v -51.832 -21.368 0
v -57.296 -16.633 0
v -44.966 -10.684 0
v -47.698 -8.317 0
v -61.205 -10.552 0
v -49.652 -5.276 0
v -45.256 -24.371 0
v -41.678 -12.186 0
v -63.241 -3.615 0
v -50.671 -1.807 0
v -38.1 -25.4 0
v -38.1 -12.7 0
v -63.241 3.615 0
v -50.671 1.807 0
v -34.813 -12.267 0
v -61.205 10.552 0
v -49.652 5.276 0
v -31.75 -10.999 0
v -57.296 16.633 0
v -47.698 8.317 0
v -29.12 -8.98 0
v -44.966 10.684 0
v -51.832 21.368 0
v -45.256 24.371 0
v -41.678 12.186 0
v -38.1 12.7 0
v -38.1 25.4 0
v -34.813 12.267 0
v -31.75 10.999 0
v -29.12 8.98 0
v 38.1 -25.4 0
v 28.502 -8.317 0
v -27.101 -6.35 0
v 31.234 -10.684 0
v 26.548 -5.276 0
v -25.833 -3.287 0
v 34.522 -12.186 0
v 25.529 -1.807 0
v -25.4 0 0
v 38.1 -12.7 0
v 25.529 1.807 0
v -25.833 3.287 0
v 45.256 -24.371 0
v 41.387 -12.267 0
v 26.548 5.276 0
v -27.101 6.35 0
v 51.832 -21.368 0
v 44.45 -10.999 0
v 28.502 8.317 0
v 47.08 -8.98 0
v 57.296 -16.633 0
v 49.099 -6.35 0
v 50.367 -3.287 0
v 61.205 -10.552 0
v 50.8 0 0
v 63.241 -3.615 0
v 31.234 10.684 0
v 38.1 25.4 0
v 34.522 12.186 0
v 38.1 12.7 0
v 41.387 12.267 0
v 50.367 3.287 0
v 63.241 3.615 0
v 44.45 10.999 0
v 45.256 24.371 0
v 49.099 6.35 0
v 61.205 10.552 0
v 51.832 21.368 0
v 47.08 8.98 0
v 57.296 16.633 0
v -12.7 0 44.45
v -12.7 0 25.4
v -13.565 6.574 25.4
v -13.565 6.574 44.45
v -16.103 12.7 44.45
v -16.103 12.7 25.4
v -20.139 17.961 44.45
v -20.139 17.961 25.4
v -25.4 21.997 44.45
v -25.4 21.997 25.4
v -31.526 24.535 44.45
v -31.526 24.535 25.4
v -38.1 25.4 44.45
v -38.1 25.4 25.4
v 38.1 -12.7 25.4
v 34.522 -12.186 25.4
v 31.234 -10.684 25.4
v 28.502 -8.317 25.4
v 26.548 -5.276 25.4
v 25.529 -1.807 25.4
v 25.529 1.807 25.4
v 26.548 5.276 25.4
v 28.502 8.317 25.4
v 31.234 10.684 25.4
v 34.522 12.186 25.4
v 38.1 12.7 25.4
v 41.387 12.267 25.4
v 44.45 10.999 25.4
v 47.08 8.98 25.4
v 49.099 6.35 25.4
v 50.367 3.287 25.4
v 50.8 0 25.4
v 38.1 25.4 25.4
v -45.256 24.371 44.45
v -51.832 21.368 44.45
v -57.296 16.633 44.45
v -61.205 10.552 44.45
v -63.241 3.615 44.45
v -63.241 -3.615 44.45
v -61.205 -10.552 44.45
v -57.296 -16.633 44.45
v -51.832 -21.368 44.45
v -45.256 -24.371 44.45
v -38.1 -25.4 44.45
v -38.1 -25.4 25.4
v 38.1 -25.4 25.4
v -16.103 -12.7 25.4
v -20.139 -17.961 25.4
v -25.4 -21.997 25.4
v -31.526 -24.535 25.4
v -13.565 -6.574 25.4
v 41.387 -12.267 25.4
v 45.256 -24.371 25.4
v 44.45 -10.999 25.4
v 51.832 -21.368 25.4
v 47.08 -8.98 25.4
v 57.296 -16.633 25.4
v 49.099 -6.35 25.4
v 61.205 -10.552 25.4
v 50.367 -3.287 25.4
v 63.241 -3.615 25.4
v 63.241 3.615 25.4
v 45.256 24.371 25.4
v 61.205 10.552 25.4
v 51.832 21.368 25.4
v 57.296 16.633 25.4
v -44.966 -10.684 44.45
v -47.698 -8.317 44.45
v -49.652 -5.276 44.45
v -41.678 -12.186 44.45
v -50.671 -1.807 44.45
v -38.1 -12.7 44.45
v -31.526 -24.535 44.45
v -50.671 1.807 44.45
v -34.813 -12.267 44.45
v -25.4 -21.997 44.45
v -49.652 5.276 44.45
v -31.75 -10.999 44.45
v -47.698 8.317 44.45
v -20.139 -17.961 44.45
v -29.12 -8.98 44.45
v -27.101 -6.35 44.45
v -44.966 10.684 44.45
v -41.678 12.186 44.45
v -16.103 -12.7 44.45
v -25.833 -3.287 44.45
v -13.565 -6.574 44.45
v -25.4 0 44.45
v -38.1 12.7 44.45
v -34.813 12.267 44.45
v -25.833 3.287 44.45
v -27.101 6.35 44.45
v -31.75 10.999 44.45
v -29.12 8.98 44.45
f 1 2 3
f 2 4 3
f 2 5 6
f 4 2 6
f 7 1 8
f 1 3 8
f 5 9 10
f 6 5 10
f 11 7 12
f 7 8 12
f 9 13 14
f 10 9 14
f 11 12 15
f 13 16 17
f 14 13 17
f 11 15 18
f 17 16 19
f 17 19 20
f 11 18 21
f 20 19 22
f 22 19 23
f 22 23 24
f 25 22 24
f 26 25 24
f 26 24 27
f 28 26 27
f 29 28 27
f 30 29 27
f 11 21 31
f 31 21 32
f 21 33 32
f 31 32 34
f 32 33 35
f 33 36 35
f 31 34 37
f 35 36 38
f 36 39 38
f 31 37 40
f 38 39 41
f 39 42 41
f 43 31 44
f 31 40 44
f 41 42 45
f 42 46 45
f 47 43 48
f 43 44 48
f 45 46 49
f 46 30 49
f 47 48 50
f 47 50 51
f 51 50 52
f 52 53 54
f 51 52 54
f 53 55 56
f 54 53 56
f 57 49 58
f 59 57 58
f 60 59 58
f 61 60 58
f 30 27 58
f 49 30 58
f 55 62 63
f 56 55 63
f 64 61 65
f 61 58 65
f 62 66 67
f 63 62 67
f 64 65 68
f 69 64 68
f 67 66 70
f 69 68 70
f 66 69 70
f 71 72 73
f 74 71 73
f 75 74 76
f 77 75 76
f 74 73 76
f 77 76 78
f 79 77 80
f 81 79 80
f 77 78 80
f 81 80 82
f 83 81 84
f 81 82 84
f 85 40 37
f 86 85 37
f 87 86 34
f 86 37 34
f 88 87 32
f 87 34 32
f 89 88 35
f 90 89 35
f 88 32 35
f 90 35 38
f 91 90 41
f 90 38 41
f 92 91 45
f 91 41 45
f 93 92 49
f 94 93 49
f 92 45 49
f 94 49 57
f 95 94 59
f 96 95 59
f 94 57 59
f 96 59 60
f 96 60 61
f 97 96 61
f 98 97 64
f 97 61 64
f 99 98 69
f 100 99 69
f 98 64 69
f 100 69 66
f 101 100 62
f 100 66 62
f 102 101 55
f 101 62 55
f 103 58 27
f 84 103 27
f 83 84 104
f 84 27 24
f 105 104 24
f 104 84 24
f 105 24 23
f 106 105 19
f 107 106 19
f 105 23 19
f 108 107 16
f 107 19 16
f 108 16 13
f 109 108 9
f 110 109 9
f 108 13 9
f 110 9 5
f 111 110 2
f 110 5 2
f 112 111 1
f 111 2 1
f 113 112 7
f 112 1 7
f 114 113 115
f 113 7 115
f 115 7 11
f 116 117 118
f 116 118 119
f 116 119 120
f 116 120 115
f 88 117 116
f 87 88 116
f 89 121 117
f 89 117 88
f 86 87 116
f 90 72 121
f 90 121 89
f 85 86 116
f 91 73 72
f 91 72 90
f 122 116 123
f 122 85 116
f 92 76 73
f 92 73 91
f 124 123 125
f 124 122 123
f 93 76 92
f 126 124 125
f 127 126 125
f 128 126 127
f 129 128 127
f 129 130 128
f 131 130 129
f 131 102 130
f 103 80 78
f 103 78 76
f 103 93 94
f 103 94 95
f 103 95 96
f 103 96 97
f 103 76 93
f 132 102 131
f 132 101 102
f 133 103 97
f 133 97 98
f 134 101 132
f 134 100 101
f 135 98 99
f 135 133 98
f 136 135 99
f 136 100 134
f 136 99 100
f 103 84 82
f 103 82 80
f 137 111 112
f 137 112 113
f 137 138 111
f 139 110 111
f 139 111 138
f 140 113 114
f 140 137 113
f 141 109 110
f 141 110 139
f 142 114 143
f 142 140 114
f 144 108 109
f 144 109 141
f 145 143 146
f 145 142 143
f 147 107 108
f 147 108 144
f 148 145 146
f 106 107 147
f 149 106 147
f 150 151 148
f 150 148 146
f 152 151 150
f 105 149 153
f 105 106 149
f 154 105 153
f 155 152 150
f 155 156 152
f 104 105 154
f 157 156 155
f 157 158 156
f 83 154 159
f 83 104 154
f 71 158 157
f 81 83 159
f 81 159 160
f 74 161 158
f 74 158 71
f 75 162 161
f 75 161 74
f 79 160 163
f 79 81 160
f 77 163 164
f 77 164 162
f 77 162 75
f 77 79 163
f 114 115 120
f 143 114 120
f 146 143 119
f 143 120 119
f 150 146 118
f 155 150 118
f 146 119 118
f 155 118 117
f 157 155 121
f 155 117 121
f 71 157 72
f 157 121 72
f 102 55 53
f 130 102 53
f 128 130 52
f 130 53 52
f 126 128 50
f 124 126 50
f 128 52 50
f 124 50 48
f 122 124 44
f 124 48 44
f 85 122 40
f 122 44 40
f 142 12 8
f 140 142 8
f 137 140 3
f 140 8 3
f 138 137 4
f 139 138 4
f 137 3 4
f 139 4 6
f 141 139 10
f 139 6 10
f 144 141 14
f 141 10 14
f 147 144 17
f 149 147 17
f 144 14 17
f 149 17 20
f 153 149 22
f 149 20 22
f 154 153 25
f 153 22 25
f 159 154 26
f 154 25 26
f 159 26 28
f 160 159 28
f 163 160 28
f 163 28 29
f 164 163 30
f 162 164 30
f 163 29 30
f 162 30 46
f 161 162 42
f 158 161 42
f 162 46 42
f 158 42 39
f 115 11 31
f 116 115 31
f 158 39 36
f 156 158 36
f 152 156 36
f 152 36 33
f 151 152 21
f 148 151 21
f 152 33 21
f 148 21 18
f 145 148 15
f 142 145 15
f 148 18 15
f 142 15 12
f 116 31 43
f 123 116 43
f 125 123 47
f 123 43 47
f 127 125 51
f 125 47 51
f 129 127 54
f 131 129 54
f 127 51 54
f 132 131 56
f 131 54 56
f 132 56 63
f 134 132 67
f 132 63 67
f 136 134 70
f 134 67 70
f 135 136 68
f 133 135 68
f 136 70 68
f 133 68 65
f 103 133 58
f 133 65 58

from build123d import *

# Parameters (mm, degrees)
F1_DEPTH = 44.45
F2_DEPTH = 25.4


with BuildPart() as f1:
    # F0 (on Top) → F1 (new body)
    with BuildSketch(Plane.XY):
        with BuildLine():
            Line((-38.1, -12.7), (-38.1, -25.4))
            ThreePointArc((-38.1, -25.4), (-20.139488, -17.960512), (-12.7, 0))
            ThreePointArc((-12.7, 0), (-20.139488, 17.960512), (-38.1, 25.4))
            Line((-38.1, 25.4), (-38.1, 12.7))
            ThreePointArc((-38.1, 12.7), (-29.119744, 8.980256), (-25.4, 0))
            ThreePointArc((-25.4, 0), (-29.119744, -8.980256), (-38.1, -12.7))
        make_face()
        with BuildLine():
            ThreePointArc((-38.1, 25.4), (-63.5, 0), (-38.1, -25.4))
            Line((-38.1, -25.4), (-38.1, -12.7))
            ThreePointArc((-38.1, -12.7), (-50.8, 0), (-38.1, 12.7))
            Line((-38.1, 12.7), (-38.1, 25.4))
        make_face()
    extrude(amount=F1_DEPTH)

    # F0 (on Top) → F2 (join)
    with BuildSketch(Plane.XY):
        with BuildLine():
            ThreePointArc((-12.7, 0), (-20.139488, -17.960512), (-38.1, -25.4))
            Line((-38.1, -25.4), (38.1, -25.4))
            Line((38.1, -25.4), (38.1, -12.7))
            ThreePointArc((38.1, -12.7), (25.4, 0), (38.1, 12.7))
            Line((38.1, 12.7), (38.1, 25.4))
            Line((38.1, 25.4), (-38.1, 25.4))
            ThreePointArc((-38.1, 25.4), (-20.139488, 17.960512), (-12.7, 0))
        make_face()
        with BuildLine():
            ThreePointArc((-38.1, 25.4), (-63.5, 0), (-38.1, -25.4))
            Line((-38.1, -25.4), (-38.1, -12.7))
            ThreePointArc((-38.1, -12.7), (-50.8, 0), (-38.1, 12.7))
            Line((-38.1, 12.7), (-38.1, 25.4))
        make_face()
        with BuildLine():
            Line((38.1, -12.7), (38.1, -25.4))
            ThreePointArc((38.1, -25.4), (63.5, 0), (38.1, 25.4))
            Line((38.1, 25.4), (38.1, 12.7))
            ThreePointArc((38.1, 12.7), (47.080256, 8.980256), (50.8, 0))
            ThreePointArc((50.8, 0), (47.080256, -8.980256), (38.1, -12.7))
        make_face()
    extrude(amount=F2_DEPTH)


solid = f1.part
